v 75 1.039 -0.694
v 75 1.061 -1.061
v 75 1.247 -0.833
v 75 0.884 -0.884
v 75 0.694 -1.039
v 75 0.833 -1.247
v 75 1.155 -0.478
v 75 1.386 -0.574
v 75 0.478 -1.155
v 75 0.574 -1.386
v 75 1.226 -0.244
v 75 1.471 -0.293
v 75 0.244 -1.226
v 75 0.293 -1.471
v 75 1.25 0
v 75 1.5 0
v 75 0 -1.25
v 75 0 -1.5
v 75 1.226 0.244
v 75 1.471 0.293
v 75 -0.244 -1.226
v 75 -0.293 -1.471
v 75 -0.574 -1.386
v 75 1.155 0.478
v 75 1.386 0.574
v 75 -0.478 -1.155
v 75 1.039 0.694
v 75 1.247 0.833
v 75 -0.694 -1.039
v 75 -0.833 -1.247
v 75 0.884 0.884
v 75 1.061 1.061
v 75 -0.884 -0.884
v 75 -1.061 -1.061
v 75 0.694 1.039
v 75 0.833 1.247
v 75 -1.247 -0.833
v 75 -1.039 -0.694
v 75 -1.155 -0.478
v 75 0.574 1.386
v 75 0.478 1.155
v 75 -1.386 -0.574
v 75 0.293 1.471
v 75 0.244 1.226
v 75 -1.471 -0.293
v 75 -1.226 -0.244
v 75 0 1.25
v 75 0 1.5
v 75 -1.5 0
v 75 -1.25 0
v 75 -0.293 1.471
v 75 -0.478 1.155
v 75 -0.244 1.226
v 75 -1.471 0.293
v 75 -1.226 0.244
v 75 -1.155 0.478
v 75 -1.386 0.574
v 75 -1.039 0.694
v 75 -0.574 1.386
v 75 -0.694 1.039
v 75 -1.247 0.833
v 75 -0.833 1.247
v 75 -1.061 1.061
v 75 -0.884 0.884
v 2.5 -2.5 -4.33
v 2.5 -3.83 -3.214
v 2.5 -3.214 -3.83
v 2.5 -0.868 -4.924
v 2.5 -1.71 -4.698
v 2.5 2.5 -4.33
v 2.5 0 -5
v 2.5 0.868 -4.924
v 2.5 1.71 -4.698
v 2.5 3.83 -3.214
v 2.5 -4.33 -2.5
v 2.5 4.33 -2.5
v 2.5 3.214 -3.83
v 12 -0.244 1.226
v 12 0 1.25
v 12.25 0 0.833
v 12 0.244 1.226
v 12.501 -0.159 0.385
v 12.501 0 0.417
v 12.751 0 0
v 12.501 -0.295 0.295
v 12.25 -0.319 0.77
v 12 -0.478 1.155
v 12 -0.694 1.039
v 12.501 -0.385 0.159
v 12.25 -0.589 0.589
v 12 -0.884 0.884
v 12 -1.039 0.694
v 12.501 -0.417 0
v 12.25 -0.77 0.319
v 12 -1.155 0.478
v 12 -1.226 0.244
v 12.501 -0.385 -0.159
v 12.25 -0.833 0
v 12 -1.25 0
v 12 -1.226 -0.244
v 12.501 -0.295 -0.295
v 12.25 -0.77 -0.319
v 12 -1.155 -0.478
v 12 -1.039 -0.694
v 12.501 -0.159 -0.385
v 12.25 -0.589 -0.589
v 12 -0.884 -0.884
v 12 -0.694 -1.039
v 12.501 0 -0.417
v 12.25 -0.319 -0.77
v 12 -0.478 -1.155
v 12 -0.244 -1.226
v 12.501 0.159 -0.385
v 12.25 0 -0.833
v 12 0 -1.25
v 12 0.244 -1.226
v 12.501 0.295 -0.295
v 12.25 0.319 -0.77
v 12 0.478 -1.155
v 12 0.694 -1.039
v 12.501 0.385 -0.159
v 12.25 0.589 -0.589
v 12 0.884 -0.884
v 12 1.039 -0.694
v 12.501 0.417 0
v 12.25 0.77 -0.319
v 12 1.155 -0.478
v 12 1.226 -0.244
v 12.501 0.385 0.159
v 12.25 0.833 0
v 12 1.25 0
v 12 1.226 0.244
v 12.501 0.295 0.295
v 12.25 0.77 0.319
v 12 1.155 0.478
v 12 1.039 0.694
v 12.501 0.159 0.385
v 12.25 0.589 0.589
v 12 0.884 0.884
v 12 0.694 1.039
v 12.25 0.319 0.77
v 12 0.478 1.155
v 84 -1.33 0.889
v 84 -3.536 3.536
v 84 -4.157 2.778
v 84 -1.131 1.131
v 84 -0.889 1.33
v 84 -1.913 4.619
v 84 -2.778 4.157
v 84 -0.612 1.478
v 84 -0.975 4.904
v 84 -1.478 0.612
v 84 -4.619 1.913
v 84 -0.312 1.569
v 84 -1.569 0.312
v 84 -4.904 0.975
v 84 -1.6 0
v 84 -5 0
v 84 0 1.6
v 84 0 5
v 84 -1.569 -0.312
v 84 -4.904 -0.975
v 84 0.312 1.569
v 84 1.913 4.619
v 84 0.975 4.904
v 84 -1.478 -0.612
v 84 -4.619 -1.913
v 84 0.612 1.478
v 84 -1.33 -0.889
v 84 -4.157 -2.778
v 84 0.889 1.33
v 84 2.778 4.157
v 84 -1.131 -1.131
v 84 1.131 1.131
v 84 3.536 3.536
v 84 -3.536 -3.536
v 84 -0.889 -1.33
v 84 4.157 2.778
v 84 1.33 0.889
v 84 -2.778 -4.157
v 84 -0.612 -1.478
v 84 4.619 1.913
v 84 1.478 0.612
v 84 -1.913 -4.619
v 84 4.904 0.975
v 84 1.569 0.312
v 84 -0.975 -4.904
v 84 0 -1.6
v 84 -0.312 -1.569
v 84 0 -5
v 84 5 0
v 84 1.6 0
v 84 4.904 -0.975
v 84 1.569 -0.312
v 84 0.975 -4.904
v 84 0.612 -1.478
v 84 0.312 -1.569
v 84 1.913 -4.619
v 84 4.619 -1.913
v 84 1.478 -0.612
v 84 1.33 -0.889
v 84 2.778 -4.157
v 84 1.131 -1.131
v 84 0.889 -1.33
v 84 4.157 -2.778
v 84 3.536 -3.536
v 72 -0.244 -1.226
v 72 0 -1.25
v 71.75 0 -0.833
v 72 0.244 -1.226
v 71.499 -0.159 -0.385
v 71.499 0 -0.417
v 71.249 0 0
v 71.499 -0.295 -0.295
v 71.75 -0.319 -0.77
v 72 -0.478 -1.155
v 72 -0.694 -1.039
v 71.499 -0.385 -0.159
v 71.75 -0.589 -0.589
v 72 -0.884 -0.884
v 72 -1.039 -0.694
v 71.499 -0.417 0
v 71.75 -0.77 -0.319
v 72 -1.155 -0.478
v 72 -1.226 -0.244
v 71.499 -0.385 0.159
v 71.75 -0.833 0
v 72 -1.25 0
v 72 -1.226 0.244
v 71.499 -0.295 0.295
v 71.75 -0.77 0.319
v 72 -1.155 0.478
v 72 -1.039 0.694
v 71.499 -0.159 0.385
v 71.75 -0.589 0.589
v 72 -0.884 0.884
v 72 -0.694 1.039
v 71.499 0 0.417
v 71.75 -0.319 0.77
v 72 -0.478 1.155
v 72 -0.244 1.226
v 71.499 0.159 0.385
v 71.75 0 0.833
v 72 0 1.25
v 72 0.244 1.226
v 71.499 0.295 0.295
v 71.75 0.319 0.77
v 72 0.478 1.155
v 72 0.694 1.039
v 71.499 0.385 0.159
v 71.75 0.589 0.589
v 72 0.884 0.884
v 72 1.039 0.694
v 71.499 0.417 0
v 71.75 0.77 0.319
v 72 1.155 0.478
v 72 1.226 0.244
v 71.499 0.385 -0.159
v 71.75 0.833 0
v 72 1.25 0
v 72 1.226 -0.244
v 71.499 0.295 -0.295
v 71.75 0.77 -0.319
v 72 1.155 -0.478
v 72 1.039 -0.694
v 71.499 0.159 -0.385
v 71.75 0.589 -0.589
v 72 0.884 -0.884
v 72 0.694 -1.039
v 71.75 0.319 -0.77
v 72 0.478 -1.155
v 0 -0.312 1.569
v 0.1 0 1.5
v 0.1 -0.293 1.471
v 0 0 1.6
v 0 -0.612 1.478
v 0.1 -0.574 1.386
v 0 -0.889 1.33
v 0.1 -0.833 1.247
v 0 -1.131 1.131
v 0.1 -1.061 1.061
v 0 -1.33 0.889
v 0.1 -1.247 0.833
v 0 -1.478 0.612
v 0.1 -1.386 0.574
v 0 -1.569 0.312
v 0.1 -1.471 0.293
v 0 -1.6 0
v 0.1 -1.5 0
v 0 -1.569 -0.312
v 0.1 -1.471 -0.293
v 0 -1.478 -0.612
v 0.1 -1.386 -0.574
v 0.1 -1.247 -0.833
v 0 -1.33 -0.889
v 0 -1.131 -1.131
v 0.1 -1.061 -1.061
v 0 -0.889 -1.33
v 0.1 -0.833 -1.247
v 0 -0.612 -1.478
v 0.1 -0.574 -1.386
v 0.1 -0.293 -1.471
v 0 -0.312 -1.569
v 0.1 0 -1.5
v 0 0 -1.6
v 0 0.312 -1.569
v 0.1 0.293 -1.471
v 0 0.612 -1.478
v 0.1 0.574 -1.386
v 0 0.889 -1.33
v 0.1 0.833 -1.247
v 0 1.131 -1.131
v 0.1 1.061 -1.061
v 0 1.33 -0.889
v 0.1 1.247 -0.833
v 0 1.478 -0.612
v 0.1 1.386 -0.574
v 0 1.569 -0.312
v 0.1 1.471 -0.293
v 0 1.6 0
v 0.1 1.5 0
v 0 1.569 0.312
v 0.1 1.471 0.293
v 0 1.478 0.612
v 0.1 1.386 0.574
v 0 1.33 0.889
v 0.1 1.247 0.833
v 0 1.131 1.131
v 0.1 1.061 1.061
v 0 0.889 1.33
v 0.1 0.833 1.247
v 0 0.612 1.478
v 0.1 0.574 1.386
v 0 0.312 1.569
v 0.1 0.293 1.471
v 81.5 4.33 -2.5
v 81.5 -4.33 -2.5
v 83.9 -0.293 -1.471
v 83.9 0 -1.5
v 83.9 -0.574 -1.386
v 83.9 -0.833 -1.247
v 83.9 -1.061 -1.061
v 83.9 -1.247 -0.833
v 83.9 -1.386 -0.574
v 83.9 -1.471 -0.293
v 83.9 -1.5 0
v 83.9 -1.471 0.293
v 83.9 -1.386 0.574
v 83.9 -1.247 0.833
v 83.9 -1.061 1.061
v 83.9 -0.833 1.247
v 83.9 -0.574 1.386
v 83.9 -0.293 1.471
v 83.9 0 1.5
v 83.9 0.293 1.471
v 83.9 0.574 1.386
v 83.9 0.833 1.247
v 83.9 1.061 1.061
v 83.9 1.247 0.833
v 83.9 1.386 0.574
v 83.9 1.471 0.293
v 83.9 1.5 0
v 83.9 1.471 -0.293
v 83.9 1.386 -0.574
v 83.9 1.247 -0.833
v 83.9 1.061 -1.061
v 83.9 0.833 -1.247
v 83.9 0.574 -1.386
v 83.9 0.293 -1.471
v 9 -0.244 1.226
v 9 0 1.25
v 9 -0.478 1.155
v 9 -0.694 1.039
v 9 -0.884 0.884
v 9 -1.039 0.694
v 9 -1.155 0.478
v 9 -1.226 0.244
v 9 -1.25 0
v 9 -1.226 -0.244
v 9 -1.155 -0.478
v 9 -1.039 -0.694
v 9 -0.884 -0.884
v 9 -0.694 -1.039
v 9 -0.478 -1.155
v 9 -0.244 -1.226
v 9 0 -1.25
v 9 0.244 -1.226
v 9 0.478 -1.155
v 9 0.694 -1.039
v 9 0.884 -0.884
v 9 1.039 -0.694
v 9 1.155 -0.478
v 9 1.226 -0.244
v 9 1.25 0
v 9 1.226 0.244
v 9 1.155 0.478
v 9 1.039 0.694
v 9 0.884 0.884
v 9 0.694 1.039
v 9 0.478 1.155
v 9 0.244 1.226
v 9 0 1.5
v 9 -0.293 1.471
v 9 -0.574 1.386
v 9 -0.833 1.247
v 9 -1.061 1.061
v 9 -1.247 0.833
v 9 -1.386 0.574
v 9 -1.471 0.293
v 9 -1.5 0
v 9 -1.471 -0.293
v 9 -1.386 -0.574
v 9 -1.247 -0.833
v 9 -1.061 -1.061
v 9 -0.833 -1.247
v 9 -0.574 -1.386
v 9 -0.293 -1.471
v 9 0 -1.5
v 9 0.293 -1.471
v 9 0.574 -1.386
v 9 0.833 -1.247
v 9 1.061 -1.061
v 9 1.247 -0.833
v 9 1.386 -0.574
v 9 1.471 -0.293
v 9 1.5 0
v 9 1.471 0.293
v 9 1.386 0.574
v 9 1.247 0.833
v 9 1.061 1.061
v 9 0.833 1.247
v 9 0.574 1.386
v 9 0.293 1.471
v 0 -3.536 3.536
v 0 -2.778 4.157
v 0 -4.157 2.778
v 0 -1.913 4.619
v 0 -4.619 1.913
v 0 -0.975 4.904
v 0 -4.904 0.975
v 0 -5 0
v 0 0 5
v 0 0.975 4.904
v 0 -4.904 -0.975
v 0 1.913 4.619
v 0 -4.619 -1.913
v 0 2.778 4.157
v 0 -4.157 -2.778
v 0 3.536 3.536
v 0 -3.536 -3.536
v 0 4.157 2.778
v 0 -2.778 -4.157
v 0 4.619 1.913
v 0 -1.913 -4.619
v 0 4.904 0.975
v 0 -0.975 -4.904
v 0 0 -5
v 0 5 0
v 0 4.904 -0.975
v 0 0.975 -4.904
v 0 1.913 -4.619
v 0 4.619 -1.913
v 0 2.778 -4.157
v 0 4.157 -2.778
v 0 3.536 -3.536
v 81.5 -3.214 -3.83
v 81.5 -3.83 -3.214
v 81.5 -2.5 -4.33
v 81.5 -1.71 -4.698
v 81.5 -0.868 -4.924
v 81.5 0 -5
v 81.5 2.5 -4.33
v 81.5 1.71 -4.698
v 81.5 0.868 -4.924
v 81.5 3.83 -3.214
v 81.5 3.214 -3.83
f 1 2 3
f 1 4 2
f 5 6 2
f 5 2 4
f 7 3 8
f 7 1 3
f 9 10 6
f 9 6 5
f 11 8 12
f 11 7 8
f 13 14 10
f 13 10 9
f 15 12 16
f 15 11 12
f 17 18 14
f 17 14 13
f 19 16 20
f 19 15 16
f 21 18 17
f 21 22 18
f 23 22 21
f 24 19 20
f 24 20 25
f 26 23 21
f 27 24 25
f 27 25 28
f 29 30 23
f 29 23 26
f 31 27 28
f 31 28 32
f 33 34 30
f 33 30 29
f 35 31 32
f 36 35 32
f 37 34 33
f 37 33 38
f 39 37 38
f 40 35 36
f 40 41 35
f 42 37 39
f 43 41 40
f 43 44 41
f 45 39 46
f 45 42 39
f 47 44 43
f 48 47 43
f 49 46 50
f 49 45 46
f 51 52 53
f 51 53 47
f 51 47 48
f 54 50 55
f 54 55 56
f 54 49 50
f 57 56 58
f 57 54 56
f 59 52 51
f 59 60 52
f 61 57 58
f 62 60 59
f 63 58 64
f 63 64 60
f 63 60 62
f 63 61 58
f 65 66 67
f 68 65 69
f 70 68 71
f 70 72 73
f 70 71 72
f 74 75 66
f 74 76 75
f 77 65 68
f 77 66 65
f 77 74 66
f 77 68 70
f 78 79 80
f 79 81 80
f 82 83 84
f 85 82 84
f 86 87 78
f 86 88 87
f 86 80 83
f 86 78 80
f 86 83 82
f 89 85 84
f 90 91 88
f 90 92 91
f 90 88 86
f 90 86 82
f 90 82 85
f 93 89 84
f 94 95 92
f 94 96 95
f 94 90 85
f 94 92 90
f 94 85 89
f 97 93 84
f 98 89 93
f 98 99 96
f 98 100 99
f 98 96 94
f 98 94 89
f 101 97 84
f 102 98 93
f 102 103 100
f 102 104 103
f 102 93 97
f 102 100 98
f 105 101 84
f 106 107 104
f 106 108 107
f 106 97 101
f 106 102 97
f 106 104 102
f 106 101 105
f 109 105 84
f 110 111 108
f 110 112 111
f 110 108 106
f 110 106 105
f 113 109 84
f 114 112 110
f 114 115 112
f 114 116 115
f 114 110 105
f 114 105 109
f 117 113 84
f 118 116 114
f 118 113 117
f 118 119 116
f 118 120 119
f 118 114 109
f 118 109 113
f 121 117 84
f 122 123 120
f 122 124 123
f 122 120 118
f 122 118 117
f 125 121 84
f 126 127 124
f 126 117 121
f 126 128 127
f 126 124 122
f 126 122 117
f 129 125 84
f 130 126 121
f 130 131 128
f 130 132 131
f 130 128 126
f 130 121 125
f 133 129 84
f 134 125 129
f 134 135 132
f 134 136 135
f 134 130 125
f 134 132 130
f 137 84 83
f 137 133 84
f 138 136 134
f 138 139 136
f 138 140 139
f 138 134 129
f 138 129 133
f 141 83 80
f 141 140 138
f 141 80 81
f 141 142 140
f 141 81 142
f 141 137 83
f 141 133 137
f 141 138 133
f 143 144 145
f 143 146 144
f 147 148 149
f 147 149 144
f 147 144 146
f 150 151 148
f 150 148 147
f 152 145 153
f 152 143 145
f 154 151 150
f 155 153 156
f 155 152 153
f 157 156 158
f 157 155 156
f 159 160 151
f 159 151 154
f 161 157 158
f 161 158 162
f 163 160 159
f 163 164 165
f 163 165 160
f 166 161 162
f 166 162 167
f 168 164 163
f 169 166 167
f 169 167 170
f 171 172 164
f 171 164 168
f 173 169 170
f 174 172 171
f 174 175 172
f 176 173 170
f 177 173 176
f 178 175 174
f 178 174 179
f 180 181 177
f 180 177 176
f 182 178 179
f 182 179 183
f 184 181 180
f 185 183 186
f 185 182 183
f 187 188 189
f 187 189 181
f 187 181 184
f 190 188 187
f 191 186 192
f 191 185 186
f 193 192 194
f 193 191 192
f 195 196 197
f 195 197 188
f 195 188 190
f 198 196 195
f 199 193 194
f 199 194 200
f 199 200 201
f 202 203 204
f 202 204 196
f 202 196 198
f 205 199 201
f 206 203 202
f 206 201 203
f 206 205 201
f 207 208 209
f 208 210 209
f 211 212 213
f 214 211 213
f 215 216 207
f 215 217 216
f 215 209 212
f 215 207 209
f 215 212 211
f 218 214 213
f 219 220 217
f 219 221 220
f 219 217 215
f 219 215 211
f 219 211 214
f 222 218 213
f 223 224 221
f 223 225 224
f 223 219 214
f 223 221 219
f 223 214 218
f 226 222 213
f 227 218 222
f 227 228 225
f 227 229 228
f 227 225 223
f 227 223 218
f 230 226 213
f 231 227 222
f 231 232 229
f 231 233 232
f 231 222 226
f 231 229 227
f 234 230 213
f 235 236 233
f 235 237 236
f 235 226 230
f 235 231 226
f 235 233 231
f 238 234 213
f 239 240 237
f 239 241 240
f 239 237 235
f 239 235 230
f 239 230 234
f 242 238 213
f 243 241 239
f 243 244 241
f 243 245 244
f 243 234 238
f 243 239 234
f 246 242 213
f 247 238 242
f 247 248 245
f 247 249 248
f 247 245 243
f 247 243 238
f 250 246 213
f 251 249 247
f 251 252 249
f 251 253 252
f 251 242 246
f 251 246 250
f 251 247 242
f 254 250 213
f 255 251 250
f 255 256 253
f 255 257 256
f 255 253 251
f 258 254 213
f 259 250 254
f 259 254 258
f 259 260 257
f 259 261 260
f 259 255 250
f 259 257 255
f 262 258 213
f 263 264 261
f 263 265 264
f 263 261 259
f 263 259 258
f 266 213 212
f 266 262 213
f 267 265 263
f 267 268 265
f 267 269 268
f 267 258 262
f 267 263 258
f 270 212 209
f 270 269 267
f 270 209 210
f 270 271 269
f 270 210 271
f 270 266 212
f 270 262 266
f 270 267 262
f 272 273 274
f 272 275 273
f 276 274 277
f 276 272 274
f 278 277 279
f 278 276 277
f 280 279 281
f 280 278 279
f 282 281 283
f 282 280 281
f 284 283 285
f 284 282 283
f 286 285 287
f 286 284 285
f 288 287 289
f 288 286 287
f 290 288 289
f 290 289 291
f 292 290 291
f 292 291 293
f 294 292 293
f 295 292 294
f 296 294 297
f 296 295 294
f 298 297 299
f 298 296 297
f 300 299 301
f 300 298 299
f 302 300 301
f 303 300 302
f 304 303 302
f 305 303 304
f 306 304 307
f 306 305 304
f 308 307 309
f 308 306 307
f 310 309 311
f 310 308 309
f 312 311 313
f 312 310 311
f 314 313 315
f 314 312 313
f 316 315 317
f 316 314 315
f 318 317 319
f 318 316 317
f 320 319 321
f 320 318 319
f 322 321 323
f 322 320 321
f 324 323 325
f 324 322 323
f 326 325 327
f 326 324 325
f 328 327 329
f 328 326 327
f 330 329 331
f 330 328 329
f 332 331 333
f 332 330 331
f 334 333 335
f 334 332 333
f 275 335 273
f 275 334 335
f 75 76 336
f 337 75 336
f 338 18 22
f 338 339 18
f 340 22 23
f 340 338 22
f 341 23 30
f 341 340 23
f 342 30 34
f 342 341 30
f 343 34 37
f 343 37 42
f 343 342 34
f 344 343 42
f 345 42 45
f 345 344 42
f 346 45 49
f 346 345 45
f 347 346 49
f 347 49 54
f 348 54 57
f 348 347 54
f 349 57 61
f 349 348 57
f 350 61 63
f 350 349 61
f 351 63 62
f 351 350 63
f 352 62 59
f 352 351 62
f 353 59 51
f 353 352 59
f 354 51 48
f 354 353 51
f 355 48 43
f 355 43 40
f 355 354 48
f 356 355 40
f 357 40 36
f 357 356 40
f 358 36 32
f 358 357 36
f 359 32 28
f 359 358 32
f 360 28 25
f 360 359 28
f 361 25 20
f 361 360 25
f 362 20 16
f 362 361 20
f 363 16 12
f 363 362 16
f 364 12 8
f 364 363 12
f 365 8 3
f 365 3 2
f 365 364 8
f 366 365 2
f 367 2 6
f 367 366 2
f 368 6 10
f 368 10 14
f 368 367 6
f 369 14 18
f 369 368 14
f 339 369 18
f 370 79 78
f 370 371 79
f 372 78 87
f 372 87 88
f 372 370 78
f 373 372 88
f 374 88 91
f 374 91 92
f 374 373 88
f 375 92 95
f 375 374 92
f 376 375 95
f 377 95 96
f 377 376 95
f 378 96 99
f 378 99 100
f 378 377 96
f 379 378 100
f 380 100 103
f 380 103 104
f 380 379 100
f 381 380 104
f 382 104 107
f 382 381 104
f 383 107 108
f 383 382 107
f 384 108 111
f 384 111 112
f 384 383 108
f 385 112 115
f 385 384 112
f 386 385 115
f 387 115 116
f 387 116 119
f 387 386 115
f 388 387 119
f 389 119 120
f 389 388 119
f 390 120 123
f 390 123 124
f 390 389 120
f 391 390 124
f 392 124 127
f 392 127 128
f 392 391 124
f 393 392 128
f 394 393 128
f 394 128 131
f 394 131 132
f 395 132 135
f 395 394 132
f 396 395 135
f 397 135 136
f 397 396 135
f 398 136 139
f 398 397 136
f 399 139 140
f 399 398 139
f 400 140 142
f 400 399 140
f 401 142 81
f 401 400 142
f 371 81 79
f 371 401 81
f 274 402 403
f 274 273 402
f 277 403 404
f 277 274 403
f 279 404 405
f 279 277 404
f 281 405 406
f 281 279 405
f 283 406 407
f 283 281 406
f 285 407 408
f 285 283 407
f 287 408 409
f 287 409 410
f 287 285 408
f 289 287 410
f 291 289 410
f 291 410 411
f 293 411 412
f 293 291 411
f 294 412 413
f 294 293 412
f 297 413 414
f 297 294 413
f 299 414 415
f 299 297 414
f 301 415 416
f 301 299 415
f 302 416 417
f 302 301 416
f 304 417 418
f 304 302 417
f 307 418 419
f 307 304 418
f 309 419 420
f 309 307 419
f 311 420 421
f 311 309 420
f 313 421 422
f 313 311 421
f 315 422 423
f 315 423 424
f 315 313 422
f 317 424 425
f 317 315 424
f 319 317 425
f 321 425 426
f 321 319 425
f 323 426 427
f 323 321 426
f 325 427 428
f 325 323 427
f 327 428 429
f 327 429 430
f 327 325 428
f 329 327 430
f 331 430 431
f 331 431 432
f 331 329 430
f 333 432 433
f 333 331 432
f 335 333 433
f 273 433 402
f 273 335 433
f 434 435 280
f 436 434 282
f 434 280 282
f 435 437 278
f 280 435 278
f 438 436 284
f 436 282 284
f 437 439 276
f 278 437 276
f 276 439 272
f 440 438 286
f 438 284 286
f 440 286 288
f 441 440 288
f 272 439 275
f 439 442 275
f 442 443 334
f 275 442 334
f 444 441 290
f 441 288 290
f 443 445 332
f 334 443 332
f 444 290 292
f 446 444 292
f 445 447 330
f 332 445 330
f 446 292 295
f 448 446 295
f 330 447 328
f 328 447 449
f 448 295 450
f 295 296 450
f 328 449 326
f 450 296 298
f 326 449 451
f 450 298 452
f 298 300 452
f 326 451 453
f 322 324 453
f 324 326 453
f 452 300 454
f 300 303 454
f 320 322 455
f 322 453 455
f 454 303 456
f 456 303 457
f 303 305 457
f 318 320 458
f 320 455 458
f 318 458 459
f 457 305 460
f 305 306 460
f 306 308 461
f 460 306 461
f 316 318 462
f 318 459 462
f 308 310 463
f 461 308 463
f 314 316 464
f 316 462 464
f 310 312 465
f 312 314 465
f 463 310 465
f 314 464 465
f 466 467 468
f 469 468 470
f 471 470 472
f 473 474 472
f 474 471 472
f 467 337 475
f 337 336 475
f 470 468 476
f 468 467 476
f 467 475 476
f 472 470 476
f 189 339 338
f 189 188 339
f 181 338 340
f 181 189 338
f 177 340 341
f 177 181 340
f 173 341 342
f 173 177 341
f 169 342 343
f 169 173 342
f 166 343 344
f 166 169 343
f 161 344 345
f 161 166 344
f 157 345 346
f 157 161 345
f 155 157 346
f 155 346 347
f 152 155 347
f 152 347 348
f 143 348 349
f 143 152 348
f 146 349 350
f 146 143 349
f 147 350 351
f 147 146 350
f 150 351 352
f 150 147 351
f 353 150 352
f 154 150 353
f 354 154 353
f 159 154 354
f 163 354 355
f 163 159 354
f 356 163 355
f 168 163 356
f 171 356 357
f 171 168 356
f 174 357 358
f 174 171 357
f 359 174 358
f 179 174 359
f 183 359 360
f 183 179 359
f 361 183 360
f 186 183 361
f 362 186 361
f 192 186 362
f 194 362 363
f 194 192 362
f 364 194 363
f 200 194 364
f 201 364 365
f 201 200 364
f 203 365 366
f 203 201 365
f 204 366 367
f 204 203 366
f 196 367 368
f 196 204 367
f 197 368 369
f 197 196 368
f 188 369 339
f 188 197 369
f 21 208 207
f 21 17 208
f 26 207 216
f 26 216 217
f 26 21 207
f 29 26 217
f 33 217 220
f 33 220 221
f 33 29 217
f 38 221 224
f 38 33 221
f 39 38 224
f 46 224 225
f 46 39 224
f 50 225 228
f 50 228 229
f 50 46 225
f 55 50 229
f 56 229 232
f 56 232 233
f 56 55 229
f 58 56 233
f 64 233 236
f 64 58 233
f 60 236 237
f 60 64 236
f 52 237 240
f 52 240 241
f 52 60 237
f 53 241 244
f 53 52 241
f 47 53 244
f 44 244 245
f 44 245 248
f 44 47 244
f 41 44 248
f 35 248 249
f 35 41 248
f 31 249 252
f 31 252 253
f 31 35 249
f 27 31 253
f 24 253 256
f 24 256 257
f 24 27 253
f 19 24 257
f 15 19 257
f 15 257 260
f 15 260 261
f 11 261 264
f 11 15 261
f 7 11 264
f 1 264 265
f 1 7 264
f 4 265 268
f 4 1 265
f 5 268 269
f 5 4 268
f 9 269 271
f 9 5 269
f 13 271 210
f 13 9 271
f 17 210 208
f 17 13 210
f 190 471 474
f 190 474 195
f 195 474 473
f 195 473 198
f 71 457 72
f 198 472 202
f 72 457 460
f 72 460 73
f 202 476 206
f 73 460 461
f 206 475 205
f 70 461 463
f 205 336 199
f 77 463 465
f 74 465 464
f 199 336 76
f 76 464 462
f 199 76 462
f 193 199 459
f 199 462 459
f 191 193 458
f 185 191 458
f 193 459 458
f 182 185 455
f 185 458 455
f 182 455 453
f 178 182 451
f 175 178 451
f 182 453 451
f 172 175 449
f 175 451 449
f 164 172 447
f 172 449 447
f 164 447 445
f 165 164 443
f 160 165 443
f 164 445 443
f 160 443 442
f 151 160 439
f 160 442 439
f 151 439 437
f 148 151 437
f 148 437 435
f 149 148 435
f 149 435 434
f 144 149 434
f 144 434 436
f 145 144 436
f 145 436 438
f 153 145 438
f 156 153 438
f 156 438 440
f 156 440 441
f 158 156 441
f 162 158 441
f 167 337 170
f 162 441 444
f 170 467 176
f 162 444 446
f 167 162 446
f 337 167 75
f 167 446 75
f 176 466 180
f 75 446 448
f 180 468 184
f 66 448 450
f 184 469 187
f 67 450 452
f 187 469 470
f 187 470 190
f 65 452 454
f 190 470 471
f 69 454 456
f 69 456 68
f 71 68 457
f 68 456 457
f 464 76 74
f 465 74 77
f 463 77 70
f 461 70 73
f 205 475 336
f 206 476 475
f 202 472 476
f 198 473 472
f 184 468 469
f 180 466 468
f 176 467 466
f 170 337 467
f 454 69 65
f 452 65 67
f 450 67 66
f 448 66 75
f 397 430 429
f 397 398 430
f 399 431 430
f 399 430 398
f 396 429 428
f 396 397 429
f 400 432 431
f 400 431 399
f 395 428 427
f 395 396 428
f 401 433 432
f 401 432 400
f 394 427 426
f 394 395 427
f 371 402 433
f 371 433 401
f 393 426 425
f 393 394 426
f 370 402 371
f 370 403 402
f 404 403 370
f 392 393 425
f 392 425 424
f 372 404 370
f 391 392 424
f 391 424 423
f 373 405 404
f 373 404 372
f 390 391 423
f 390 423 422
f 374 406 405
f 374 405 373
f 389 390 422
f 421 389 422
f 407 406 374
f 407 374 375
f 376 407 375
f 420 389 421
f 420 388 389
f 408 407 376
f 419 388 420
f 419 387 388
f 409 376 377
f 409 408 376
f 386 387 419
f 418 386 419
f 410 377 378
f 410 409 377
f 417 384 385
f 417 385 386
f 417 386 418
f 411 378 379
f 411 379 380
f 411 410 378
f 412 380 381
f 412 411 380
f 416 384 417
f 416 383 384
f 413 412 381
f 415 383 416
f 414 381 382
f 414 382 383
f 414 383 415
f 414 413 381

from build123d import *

# Parameters (mm, degrees)
SKETCH_1_R               = 5
EXTRUDE_1_DEPTH          = 84
SKETCH_6_W               = 79
SKETCH_6_H               = 8.752302232
CUT_EXTRUDE_1_DEPTH      = 6
CUT_EXTRUDE_1_DEPTH_BACK = 6


with BuildPart() as part:
    # Эскиз1 → Бобышка-Вытянуть1 (new body)
    with BuildSketch(Plane(origin=(0, 0, 0), x_dir=(0, 0, -1), z_dir=(1, 0, 0))):
        Circle(SKETCH_1_R)
    extrude(amount=EXTRUDE_1_DEPTH)

    # Эскиз2 → Отверстие обработанное метчиком M31 (revolve, cut)
    with BuildSketch(Plane.ZX):
        Polygon((0, 0), (0, 12.751075774), (1.25, 12), (1.25, 9), (1.5, 9), (1.5, 0.1), (1.6, 0), align=None)
    revolve(axis=Axis((-6.35, 0, 0), (1, 0, 0)), mode=Mode.SUBTRACT)

    # Эскиз4 → Отверстие обработанное метчиком M32 (revolve, cut)
    with BuildSketch(Plane(origin=(84, 0, 0), x_dir=(0, 0, -1), z_dir=(0, 1, 0))):
        Polygon((0, 0), (0, 12.751075774), (1.25, 12), (1.25, 9), (1.5, 9), (1.5, 0.1), (1.6, 0), align=None)
    revolve(axis=Axis((90.35, 0, 0), (-1, 0, 0)), mode=Mode.SUBTRACT)

    # Эскиз6 → Вырез-Вытянуть1 (cut, two sides)
    with BuildSketch(Plane(origin=(0, 0, 0), x_dir=(1, 0, 0), z_dir=(0, 1, 0))) as cut_extrude_1_sk:
        with Locations((42, 6.876151116)):
            Rectangle(SKETCH_6_W, SKETCH_6_H)
    extrude(amount=CUT_EXTRUDE_1_DEPTH, mode=Mode.SUBTRACT)
    extrude(cut_extrude_1_sk.sketch, amount=-CUT_EXTRUDE_1_DEPTH_BACK, mode=Mode.SUBTRACT)


solid = part.part
